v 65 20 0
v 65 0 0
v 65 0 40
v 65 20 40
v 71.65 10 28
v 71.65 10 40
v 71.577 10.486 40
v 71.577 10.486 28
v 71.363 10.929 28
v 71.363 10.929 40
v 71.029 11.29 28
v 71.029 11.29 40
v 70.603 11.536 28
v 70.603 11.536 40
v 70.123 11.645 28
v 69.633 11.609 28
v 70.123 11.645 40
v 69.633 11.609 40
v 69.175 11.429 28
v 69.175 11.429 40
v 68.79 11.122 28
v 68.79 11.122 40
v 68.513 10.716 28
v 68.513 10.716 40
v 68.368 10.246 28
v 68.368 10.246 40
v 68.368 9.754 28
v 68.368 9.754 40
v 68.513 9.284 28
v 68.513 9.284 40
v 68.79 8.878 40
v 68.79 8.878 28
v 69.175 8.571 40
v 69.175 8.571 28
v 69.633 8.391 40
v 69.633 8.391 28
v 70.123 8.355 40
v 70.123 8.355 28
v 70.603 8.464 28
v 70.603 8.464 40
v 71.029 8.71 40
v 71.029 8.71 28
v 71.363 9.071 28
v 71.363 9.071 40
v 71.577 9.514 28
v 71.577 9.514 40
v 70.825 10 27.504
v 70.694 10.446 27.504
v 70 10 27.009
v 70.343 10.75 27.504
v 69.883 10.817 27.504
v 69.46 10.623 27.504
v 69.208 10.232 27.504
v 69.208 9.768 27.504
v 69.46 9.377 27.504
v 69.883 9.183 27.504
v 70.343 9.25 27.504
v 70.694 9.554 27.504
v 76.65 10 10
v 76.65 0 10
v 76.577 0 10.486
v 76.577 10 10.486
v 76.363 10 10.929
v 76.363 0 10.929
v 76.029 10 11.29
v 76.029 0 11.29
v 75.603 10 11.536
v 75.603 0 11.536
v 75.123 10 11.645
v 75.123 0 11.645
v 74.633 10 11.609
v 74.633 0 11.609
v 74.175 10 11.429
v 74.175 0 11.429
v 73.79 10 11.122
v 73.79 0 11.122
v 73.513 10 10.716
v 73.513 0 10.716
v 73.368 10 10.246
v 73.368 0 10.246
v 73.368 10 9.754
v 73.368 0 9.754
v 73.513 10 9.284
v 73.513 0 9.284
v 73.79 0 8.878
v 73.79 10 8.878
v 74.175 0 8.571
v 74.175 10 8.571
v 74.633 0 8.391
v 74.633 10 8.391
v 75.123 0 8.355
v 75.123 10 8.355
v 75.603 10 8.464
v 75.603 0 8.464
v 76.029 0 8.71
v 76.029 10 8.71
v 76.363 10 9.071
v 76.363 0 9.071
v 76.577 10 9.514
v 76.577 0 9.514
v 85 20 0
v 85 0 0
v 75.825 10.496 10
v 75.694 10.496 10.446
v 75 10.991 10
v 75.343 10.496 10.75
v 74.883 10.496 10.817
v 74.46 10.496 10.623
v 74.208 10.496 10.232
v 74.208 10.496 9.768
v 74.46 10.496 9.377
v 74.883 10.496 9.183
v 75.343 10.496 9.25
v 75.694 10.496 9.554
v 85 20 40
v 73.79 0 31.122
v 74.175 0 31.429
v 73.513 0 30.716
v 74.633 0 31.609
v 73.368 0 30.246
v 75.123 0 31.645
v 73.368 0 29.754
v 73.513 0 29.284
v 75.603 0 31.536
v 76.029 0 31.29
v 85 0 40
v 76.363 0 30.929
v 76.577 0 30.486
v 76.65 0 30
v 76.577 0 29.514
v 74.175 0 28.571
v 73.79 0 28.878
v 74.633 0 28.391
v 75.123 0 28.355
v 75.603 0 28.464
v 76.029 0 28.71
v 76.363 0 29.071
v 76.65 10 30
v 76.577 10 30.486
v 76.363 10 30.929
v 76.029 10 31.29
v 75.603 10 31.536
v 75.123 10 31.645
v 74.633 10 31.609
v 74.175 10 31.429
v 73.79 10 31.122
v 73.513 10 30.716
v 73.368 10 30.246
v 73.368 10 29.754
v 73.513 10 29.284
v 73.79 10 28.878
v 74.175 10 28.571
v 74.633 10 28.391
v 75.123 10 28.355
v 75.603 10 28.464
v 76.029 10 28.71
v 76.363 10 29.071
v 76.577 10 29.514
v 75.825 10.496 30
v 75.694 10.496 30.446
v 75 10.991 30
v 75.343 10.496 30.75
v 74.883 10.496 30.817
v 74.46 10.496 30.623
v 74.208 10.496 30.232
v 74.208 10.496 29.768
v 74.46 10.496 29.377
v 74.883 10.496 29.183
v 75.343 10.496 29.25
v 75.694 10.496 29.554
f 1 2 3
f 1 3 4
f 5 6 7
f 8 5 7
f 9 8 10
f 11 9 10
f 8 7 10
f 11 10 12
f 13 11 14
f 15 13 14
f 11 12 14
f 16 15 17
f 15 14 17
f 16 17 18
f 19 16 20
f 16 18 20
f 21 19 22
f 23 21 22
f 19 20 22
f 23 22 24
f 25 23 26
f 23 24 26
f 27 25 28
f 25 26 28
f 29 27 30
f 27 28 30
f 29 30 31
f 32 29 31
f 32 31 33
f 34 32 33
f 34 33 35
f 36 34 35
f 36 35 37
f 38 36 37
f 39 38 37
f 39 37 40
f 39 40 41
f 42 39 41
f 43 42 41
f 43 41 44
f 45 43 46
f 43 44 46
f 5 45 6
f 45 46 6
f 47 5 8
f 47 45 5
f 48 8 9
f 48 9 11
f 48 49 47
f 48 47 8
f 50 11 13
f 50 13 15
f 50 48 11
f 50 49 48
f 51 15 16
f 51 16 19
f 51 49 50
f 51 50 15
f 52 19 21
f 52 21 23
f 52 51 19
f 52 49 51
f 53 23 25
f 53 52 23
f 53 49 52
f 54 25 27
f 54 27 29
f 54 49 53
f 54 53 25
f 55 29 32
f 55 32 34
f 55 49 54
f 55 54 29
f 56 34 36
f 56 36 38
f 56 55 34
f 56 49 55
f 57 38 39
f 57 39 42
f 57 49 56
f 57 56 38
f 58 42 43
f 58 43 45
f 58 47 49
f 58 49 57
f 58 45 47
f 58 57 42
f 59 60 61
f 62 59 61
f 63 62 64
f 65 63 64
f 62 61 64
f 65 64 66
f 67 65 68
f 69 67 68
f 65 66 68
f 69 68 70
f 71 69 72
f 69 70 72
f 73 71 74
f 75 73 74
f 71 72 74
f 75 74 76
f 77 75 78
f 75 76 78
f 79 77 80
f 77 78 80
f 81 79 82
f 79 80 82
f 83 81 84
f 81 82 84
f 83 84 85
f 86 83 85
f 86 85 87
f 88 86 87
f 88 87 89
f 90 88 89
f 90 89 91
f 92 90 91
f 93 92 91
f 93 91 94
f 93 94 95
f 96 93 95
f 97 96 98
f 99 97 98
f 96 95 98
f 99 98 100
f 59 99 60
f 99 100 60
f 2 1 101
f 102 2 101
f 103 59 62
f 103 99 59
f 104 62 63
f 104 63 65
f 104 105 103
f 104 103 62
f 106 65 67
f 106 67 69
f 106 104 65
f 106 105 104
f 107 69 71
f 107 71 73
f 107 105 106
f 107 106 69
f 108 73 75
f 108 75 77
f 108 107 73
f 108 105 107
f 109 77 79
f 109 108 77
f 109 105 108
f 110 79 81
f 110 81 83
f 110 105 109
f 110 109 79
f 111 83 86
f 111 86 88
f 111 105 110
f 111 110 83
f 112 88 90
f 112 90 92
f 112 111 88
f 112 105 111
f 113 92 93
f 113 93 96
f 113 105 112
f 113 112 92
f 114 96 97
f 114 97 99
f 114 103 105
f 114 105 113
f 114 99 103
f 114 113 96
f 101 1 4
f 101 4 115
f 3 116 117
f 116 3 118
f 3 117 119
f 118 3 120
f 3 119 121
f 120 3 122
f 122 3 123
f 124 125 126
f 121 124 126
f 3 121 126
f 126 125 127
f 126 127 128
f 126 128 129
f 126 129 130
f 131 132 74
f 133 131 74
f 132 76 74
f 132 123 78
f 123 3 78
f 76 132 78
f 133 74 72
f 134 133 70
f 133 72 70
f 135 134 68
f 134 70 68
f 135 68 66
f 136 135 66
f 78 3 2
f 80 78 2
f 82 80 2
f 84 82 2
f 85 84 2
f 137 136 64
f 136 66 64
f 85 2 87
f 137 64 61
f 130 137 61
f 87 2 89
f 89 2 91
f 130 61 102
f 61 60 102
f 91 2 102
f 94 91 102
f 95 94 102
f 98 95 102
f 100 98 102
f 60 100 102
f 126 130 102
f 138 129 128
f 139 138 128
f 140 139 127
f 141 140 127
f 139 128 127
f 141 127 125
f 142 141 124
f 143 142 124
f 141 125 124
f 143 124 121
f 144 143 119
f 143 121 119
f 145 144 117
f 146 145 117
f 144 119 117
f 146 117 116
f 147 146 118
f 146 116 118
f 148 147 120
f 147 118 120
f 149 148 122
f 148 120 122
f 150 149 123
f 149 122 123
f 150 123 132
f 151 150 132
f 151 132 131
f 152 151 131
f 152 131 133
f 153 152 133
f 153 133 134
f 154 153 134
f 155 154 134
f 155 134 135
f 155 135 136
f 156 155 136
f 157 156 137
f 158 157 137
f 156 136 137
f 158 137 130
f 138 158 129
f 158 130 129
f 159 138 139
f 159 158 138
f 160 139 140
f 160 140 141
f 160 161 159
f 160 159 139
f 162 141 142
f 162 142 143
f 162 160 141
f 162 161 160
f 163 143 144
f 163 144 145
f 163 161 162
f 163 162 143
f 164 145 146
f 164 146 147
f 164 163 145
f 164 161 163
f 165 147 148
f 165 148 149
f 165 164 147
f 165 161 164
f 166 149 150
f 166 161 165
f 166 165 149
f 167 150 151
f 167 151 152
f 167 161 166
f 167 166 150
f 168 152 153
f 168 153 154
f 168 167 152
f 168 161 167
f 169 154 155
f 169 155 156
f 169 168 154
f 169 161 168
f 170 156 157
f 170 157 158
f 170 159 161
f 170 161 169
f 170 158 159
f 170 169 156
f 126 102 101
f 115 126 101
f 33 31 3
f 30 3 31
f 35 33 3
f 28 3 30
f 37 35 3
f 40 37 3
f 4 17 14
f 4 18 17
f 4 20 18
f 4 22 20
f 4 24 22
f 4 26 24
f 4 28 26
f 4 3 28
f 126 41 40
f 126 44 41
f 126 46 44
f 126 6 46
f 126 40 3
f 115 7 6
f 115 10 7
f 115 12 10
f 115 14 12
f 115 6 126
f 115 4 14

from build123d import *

# Parameters (mm, degrees)
SKETCH_W       = 20
SKETCH_H       = 20
PAD_DEPTH      = 40
SKETCH001_R    = 1.65
HOLE_DEPTH     = 10
HOLE_TIPS_R    = 1.65
SKETCH002_R    = 1.65
HOLE001_DEPTH  = 12
HOLE001_TIPS_R = 1.65


with BuildPart() as part:
    # Sketch → Pad (new body)
    with BuildSketch(Plane.XY):
        with Locations((75, 10)):
            Rectangle(SKETCH_W, SKETCH_H)
    extrude(amount=PAD_DEPTH)

    # Sketch001 (on Face1 of Pad) → Hole (cut)
    with BuildSketch(Plane.XZ):
        with Locations((75, 30)):
            Circle(SKETCH001_R)
        with Locations((75, 10)):
            Circle(SKETCH001_R)
    extrude(amount=-HOLE_DEPTH, mode=Mode.SUBTRACT)

    # Hole tips → Hole tip 1 section 0
    with BuildSketch(Plane.XZ.offset(-10), mode=Mode.PRIVATE) as hole_tip_1_s0:
        with Locations((75, 30)):
            Circle(HOLE_TIPS_R)
    loft([hole_tip_1_s0.sketch, Vertex(75, 10.99142, 30)], mode=Mode.SUBTRACT)

    # Hole tips → Hole tip 2 section 0
    with BuildSketch(Plane.XZ.offset(-10), mode=Mode.PRIVATE) as hole_tip_2_s0:
        with Locations((75, 10)):
            Circle(HOLE_TIPS_R)
    loft([hole_tip_2_s0.sketch, Vertex(75, 10.99142, 10)], mode=Mode.SUBTRACT)

    # Sketch002 (on Face4 of Hole) → Hole001 (cut)
    with BuildSketch(Plane.XY.offset(40)):
        with Locations((70, 10)):
            Circle(SKETCH002_R)
    extrude(amount=-HOLE001_DEPTH, mode=Mode.SUBTRACT)

    # Hole001 tips → Hole001 tip 1 section 0
    with BuildSketch(Plane.XY.offset(28), mode=Mode.PRIVATE) as hole001_tip_1_s0:
        with Locations((70, 10)):
            Circle(HOLE001_TIPS_R)
    loft([hole001_tip_1_s0.sketch, Vertex(70, 10, 27.00858)], mode=Mode.SUBTRACT)


solid = part.part
